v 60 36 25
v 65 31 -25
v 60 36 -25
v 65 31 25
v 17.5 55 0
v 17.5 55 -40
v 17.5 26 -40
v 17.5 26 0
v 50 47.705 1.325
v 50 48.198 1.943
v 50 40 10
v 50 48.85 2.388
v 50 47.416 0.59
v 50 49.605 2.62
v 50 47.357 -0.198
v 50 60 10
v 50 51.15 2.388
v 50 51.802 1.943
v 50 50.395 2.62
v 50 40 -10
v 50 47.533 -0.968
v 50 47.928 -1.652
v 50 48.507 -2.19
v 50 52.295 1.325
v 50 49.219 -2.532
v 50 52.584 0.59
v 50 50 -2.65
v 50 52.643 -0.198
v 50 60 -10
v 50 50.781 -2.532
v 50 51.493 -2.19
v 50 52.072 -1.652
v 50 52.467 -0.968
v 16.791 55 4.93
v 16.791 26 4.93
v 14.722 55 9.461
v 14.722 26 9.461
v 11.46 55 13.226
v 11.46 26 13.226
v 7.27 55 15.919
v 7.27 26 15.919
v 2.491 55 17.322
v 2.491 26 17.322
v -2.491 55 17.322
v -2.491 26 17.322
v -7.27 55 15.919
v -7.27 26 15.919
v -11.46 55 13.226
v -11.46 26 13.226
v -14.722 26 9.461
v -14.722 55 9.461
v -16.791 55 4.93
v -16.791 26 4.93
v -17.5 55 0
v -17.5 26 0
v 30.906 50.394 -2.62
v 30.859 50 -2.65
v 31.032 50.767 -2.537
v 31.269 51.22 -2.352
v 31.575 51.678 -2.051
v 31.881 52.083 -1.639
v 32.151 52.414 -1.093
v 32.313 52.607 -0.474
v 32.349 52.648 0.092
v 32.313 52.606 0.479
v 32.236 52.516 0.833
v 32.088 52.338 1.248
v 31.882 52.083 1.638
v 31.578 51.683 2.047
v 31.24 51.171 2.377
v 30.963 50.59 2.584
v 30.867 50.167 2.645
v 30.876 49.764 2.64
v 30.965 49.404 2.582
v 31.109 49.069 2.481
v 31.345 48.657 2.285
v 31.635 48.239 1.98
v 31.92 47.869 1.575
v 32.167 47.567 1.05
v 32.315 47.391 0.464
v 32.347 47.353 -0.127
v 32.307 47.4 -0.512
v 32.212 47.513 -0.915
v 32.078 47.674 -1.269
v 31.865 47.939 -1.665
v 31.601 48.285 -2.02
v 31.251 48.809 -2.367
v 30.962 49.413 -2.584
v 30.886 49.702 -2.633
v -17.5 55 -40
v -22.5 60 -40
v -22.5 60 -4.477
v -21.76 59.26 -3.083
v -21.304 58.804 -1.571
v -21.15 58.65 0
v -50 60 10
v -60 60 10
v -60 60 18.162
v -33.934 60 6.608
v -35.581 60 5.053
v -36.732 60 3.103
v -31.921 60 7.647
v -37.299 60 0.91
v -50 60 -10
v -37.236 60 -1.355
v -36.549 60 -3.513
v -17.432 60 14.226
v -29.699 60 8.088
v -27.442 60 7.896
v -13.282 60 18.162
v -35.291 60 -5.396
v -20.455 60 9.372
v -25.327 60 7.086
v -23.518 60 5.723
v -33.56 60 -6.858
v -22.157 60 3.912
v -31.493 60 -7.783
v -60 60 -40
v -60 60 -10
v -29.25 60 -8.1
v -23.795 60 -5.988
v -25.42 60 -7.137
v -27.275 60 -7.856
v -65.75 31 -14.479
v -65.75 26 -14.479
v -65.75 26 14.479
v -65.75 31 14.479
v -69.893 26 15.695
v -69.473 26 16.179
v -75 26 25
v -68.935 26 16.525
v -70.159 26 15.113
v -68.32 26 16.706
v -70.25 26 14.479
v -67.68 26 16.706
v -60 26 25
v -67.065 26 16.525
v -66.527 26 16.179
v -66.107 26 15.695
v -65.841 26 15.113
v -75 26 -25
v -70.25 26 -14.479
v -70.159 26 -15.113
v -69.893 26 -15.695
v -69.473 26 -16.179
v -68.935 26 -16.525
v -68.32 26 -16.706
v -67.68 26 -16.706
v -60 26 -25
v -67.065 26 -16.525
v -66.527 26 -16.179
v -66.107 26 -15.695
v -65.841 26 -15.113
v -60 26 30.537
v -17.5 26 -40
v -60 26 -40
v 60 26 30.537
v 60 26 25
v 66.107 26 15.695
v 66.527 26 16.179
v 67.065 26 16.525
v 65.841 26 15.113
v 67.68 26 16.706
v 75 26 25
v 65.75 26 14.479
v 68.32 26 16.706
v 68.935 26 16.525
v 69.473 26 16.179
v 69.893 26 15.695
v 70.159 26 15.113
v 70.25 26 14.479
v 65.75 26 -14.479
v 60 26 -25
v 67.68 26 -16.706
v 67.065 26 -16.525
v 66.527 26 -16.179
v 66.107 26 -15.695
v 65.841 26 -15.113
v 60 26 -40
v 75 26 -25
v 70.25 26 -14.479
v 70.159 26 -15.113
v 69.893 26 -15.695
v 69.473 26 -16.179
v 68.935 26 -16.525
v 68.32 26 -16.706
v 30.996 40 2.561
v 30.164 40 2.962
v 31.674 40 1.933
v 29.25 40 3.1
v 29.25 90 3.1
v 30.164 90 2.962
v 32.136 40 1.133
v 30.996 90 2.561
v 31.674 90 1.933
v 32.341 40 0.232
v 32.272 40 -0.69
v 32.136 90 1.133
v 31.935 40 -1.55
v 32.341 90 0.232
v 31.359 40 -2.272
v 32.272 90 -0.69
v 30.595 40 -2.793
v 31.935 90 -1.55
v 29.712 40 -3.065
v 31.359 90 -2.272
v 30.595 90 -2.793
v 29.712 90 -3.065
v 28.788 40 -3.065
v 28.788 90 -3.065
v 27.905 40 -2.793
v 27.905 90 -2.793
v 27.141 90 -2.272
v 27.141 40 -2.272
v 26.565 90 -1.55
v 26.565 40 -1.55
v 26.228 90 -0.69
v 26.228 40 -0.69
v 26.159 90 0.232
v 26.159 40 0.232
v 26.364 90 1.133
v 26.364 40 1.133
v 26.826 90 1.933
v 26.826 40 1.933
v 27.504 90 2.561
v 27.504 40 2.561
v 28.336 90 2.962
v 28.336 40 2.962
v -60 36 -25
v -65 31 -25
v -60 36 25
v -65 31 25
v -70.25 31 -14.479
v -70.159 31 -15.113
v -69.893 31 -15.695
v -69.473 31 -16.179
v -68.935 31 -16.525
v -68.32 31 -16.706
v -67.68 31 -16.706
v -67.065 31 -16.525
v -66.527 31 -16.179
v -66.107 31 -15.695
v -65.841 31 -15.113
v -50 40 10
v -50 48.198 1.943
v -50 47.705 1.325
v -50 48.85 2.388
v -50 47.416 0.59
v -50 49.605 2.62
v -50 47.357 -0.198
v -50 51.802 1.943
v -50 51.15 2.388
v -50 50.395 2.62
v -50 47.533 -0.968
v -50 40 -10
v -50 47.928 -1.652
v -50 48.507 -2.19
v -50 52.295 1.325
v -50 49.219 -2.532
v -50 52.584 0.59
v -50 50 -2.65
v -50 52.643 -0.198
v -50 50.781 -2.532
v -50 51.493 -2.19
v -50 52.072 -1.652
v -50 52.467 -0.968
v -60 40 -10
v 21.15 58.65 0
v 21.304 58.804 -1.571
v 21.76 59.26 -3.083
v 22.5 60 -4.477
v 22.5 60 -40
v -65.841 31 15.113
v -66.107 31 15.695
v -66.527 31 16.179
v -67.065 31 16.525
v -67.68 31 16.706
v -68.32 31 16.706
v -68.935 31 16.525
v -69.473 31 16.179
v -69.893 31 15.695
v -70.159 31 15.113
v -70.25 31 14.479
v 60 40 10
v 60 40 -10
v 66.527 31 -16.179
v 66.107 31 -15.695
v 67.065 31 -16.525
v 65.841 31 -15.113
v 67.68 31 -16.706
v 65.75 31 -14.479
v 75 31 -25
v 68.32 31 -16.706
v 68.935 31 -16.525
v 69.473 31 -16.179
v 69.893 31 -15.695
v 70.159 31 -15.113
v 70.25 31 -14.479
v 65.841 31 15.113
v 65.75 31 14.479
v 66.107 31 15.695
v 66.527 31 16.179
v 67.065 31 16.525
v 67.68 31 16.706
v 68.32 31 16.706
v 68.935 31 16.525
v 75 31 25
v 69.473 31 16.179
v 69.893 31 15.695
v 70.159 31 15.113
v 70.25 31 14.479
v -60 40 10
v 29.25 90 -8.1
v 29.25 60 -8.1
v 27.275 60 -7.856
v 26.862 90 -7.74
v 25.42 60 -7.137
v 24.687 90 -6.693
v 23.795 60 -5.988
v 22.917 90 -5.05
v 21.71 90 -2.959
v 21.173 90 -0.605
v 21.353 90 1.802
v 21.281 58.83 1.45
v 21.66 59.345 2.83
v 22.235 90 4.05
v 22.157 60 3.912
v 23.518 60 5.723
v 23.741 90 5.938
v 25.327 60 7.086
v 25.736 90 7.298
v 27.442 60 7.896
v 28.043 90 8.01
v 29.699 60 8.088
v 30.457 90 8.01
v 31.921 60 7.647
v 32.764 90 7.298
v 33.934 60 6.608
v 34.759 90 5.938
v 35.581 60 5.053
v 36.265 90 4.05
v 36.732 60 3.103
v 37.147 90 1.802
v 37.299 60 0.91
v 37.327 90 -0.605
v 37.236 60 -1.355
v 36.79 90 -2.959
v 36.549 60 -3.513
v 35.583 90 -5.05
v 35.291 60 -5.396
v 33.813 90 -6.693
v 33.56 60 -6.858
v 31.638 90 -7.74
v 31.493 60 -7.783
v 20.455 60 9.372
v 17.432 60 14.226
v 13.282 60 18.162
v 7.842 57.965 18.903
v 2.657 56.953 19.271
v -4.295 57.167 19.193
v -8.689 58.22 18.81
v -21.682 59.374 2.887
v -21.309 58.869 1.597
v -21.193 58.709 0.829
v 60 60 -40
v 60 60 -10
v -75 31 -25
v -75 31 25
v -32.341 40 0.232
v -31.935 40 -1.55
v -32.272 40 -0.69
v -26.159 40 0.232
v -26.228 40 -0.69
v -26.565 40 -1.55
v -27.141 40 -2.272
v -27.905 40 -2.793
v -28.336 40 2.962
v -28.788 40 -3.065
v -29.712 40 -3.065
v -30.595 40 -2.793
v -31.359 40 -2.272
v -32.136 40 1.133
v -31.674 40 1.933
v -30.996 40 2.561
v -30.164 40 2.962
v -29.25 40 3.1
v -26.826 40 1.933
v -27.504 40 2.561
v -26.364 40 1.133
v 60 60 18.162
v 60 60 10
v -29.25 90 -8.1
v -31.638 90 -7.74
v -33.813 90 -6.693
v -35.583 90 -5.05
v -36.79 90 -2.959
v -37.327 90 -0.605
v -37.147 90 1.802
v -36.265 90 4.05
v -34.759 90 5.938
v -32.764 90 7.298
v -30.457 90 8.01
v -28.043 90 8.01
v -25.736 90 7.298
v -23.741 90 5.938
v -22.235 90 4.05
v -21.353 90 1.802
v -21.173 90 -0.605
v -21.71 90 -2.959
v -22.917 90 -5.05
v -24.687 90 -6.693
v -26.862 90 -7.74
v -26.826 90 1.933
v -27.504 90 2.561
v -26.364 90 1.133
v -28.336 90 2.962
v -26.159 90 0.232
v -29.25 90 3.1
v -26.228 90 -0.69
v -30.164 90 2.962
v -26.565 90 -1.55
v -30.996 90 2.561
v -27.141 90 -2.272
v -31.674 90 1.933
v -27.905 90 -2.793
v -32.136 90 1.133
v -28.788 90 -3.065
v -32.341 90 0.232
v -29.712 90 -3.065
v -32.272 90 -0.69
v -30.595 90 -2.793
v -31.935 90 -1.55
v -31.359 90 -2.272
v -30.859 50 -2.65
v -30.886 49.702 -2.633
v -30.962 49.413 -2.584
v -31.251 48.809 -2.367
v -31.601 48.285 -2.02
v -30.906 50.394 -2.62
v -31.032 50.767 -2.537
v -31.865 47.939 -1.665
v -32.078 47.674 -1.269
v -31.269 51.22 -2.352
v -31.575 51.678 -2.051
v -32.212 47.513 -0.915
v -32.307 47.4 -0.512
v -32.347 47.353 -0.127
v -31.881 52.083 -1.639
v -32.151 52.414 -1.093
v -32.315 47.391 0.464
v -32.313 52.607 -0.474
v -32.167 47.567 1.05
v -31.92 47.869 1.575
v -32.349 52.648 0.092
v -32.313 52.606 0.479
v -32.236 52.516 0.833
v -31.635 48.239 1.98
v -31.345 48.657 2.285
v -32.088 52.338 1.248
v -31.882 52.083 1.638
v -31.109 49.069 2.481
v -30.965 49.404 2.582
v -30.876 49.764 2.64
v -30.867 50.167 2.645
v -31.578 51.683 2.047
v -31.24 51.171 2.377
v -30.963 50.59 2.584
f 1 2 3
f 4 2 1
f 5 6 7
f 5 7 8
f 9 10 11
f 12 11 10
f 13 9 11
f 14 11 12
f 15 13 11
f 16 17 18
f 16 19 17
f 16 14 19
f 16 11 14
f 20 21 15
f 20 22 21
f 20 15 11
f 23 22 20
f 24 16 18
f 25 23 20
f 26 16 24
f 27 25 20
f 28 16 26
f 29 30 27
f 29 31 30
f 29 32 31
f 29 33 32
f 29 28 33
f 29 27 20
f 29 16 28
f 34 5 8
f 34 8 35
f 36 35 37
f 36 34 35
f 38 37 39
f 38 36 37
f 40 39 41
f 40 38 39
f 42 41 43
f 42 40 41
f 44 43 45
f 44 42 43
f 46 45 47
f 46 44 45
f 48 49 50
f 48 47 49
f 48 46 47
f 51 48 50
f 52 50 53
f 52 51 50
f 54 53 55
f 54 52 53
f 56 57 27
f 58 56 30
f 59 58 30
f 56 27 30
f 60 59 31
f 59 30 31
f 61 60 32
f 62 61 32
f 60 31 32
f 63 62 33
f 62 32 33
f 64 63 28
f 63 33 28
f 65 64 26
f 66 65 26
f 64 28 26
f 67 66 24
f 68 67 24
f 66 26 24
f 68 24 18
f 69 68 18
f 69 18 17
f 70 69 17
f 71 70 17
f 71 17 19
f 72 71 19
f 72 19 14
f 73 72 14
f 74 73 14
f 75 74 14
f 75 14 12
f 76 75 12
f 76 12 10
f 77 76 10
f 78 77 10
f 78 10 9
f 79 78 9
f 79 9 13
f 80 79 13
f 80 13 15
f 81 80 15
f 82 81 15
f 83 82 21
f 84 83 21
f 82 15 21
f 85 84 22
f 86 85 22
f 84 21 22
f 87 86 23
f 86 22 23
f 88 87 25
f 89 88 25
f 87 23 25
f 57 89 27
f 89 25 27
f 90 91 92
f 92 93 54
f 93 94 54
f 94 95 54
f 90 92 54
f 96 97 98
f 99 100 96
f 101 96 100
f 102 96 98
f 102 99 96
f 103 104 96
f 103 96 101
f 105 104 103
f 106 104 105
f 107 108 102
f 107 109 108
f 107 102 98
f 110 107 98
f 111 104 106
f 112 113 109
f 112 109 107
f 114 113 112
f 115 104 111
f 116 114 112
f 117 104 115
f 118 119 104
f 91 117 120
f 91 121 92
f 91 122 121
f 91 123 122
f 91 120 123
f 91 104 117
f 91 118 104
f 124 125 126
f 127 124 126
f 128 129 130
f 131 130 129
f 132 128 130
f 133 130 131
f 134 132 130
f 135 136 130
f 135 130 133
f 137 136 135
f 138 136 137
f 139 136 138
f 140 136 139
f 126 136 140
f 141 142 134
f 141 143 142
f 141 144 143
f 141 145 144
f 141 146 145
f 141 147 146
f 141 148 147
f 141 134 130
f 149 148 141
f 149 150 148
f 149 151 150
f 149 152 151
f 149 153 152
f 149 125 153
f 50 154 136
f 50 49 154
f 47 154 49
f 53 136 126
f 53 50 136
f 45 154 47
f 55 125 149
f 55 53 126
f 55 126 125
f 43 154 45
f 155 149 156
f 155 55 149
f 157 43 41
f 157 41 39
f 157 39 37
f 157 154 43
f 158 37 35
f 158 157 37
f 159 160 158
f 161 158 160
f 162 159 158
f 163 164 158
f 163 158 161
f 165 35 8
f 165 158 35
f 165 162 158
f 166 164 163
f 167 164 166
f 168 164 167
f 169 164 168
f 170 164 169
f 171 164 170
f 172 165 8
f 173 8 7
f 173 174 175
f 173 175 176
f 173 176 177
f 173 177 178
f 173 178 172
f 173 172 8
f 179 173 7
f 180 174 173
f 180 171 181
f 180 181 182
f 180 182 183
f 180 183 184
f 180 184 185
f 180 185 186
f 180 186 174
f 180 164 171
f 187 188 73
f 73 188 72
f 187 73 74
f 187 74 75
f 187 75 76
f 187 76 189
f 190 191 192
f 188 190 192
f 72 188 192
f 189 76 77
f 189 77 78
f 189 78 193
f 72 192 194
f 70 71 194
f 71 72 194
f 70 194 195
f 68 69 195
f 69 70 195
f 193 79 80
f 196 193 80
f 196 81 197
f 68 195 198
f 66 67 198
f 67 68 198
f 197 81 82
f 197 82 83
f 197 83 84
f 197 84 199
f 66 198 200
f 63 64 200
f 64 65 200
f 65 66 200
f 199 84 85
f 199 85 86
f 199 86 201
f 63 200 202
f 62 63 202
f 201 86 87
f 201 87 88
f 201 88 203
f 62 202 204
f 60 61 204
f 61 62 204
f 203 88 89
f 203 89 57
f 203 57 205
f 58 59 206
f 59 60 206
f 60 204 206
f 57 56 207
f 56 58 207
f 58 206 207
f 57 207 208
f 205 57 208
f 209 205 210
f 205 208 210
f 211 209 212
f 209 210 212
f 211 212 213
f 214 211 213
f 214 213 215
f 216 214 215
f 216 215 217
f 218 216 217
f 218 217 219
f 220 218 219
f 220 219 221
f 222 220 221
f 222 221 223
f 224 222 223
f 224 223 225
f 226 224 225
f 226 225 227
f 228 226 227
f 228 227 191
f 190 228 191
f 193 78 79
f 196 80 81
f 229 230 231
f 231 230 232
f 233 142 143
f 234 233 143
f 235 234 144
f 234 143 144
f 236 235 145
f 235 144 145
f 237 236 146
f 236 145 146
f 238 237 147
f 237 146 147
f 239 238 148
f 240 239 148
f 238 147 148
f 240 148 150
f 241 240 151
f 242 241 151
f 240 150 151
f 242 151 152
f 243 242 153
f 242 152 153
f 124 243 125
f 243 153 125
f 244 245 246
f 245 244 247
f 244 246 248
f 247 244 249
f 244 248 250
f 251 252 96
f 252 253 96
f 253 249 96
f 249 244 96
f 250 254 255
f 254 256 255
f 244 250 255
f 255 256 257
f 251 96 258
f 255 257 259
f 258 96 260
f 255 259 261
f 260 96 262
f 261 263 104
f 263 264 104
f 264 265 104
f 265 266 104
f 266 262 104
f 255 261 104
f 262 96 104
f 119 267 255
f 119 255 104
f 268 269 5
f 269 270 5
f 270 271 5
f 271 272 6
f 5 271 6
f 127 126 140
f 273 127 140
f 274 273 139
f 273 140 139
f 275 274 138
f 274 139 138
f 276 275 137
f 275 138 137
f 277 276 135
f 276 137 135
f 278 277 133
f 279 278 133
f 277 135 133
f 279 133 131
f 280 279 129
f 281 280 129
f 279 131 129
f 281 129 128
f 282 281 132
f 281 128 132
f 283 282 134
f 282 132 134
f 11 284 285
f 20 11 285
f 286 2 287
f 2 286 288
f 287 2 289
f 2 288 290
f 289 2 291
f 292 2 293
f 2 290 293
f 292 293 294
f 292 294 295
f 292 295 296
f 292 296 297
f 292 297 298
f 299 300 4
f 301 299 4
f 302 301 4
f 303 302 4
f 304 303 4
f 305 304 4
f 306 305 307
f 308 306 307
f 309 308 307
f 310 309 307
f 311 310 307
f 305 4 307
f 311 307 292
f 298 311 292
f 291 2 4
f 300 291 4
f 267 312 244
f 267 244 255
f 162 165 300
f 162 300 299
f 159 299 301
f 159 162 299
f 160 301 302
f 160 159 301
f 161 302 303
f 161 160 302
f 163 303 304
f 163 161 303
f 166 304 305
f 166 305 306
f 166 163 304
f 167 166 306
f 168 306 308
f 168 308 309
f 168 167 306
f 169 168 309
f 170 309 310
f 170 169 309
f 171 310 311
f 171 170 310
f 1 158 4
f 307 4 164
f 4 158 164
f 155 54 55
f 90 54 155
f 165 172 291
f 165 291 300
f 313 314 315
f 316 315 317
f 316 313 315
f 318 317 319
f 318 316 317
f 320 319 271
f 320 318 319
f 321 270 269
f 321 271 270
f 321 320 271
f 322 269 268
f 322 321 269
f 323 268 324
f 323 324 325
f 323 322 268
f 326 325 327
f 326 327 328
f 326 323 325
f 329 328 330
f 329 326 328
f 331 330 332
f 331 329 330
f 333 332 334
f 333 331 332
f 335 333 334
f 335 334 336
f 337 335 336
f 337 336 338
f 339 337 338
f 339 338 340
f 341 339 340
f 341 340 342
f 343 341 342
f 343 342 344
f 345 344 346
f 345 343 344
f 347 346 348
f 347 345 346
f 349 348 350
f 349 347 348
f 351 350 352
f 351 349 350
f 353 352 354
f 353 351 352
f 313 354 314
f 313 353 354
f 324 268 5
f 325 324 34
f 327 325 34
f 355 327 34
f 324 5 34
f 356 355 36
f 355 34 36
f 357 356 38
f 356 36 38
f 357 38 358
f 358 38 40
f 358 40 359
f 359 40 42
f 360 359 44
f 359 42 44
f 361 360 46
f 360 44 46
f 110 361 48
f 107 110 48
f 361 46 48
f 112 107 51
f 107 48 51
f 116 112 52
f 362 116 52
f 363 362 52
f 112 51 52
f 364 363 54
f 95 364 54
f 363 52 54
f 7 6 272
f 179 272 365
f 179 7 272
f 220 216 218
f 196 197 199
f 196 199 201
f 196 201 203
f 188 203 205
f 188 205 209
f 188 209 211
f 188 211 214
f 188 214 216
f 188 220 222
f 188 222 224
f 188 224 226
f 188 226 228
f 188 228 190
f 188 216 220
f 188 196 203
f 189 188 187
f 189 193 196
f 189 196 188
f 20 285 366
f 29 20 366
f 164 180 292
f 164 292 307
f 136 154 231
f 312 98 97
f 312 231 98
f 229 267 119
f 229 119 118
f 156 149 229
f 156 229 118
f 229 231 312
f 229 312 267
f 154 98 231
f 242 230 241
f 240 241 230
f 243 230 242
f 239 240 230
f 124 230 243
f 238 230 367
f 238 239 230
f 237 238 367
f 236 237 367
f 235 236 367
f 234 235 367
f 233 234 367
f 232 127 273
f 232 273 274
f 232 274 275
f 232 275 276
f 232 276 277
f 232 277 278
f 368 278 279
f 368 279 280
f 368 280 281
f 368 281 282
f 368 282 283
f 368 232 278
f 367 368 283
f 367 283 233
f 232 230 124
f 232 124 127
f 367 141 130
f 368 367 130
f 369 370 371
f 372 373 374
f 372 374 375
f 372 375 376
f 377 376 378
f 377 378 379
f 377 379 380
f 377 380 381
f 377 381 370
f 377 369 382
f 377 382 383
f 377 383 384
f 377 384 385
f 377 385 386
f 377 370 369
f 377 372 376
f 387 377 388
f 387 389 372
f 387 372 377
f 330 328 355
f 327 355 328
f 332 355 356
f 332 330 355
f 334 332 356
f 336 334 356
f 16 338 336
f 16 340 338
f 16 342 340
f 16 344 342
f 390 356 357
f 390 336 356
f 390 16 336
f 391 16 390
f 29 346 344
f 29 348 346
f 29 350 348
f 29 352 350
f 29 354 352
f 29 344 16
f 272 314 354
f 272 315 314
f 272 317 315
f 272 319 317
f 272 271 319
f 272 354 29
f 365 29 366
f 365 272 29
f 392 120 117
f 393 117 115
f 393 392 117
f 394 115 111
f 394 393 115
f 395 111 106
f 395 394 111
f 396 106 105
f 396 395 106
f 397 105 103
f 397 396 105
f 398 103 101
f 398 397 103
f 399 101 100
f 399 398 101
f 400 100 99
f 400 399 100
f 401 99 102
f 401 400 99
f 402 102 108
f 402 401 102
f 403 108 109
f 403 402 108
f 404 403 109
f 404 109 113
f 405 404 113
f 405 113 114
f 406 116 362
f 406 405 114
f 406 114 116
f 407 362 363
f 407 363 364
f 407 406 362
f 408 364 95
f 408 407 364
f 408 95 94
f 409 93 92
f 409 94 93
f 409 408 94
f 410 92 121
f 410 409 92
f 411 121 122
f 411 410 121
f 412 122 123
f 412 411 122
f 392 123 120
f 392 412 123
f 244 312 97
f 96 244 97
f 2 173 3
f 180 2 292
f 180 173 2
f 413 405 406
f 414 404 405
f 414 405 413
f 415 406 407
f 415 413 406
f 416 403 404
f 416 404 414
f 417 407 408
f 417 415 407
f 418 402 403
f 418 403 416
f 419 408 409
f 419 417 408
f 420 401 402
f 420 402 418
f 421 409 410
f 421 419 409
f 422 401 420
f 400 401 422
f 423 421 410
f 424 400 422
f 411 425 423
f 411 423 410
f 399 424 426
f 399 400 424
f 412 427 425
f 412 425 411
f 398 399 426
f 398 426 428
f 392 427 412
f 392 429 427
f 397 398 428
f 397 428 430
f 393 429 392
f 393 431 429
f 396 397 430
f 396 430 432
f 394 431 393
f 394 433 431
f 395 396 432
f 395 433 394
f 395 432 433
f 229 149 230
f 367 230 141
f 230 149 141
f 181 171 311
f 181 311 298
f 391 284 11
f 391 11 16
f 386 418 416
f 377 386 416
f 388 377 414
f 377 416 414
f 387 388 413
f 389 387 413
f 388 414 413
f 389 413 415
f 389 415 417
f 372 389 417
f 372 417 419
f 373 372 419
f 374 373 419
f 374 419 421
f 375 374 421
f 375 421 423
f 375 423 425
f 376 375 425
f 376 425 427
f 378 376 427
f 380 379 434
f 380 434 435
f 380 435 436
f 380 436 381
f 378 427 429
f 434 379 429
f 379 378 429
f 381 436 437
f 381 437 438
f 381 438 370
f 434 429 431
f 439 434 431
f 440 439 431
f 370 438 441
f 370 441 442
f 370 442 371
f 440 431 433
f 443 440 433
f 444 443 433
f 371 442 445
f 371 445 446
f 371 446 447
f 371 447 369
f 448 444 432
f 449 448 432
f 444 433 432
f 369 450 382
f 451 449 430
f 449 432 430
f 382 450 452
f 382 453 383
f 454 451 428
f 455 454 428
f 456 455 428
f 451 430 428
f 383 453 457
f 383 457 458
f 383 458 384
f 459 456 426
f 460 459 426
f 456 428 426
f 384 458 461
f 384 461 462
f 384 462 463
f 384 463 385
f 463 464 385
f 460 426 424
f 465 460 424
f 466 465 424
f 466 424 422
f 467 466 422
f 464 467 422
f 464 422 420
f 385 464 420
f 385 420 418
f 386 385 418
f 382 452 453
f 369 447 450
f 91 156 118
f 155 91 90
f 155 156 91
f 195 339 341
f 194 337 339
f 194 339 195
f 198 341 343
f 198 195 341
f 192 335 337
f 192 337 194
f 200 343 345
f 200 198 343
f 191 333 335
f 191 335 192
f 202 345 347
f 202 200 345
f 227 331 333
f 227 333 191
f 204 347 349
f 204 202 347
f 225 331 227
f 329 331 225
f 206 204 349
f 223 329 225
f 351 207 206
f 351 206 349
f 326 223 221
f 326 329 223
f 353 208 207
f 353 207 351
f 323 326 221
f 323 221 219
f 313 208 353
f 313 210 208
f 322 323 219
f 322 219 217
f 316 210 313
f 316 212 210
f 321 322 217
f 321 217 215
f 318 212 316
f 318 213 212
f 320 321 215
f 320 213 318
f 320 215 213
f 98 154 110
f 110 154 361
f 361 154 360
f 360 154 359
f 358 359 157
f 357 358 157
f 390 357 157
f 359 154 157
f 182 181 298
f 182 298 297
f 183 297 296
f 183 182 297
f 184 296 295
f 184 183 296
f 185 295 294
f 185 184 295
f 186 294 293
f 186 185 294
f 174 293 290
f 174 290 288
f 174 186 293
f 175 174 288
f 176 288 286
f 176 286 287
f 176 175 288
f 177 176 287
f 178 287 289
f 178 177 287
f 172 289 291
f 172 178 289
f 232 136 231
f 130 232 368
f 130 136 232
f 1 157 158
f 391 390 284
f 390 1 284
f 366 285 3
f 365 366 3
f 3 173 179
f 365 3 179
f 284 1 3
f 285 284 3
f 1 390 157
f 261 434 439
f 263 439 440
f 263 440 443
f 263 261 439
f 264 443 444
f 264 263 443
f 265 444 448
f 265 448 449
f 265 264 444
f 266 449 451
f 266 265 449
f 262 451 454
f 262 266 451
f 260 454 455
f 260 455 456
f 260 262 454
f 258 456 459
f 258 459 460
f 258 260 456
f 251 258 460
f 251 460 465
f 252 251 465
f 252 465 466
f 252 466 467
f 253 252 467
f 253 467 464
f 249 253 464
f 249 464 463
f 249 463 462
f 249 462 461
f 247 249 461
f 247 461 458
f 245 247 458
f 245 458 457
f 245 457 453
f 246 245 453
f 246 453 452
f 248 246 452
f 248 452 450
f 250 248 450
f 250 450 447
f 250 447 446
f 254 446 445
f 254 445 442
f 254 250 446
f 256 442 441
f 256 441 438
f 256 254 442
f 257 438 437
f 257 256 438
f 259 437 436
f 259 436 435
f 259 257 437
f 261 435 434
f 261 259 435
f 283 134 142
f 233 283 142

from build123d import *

# Parameters (mm, degrees)
SKETCH1_W               = 120
SKETCH1_H               = 80
BOSS_EXTRUDE1_DEPTH     = 60
CUT_EXTRUDE1_DEPTH      = 94.808315196
SKETCH10_R              = 3.1
CUT_EXTRUDE4_DEPTH      = 20
BOSS_EXTRUDE2_START     = 30
SKETCH4_R               = 8.1
SKETCH4_R_2             = 3.1
BOSS_EXTRUDE2_DEPTH     = 30
SKETCH5_W               = 20
SKETCH5_H               = 20
CUT_EXTRUDE3_DEPTH      = 10
CUT_EXTRUDE5_REACH      = 149.648
CUT_EXTRUDE5_END_RADIUS = 3.1
SKETCH6_R               = 2.65
DRAFT2_ANGLE            = -20
CHAMFER3_SIZE           = 5
SKETCH11_W              = 95.774005991
SKETCH11_H              = 26
CUT_EXTRUDE6_DEPTH      = 156.241747021
SKETCH13_W              = 15
SKETCH13_H              = 50
BOSS_EXTRUDE3_DEPTH     = 5
CHAMFER4_SIZE           = 5


with BuildPart() as part:
    # Sketch1 → Boss-Extrude1 (new body)
    with BuildSketch(Plane(origin=(0, 0, 0), x_dir=(1, 0, 0), z_dir=(0, 1, 0))):
        Rectangle(SKETCH1_W, SKETCH1_H)
    extrude(amount=BOSS_EXTRUDE1_DEPTH)

    # Sketch2 → Cut-Extrude1 (cut, through all)
    with BuildSketch(Plane(origin=(0, 60, 0), x_dir=(1, 0, 0), z_dir=(0, 1, 0))):
        with BuildLine():
            Line((-17.5, 0), (-17.5, 40))
            Line((-17.5, 40), (17.5, 40))
            Line((17.5, 40), (17.5, 0))
            ThreePointArc((17.5, 0), (0, -17.5), (-17.5, 0))
        make_face()
    extrude(amount=-CUT_EXTRUDE1_DEPTH, mode=Mode.SUBTRACT)

    # Sketch10 → Cut-Extrude4 (cut)
    with BuildSketch(Plane(origin=(0, 60, 0), x_dir=(1, 0, 0), z_dir=(0, 1, 0))):
        with Locations(Location((-29.25, 0, 0), (0, 0, 270))):
            Circle(SKETCH10_R)
        with Locations(Location((29.25, 0, 0), (0, 0, 270))):
            Circle(SKETCH10_R)
    extrude(amount=-CUT_EXTRUDE4_DEPTH, mode=Mode.SUBTRACT)

    # Sketch4 → Boss-Extrude2 (add)
    # profile 1 of 2: a face of its own
    with BuildSketch(Plane(origin=(0, 60, 0), x_dir=(1, 0, 0), z_dir=(0, 1, 0)).offset(BOSS_EXTRUDE2_START)):
        with Locations(Location((29.25, 0, 0), (0, 0, 90))):
            Circle(SKETCH4_R)
        with Locations(Location((29.25, 0, 0), (0, 0, 270))):
            Circle(SKETCH4_R_2, mode=Mode.SUBTRACT)
    # profile 2 of 2: a face of its own
    with BuildSketch(Plane(origin=(0, 60, 0), x_dir=(1, 0, 0), z_dir=(0, 1, 0)).offset(BOSS_EXTRUDE2_START)):
        with Locations(Location((-29.25, 0, 0), (0, 0, 90))):
            Circle(SKETCH4_R)
        with Locations(Location((-29.25, 0, 0), (0, 0, 270))):
            Circle(SKETCH4_R_2, mode=Mode.SUBTRACT)
    extrude(amount=-BOSS_EXTRUDE2_DEPTH)

    # Sketch5 → Cut-Extrude3 (cut)
    with BuildSketch(Plane(origin=(60, 0, 0), x_dir=(0, 0, -1), z_dir=(1, 0, 0))):
        with Locations((0, 50)):
            Rectangle(SKETCH5_W, SKETCH5_H)
    cut_extrude3 = extrude(amount=-CUT_EXTRUDE3_DEPTH, mode=Mode.SUBTRACT)

    # Cut-Extrude5: up to this cylinder (the profile starts outside it)
    cut_extrude5_end = Plane(origin=(29.25, 50, 0), z_dir=(0, 1, 0)) * Cylinder(CUT_EXTRUDE5_END_RADIUS, 306.496, mode=Mode.PRIVATE)
    # Sketch6 → Cut-Extrude5 (cut, up to the surface)
    with BuildSketch(Plane(origin=(50, 0, 0), x_dir=(0, 0, -1), z_dir=(1, 0, 0)), mode=Mode.PRIVATE) as cut_extrude5_sk1:
        with Locations((0, 50)):
            Circle(SKETCH6_R)
    cut_extrude5_tool1 = extrude(cut_extrude5_sk1.sketch, amount=-CUT_EXTRUDE5_REACH, mode=Mode.PRIVATE) - cut_extrude5_end
    cut_extrude5 = cut_extrude5_tool1.solids().sort_by_distance((50, 50, 0))[0]
    add(cut_extrude5, mode=Mode.SUBTRACT)

    # Mirror2: Cut-Extrude3, Cut-Extrude5 across plane
    add(cut_extrude3.mirror(Plane(origin=(0, 0, 0), x_dir=(0, 0, 1), z_dir=(1, 0, 0))), mode=Mode.SUBTRACT)
    add(cut_extrude5.mirror(Plane(origin=(0, 0, 0), x_dir=(0, 0, 1), z_dir=(1, 0, 0))), mode=Mode.SUBTRACT)

    # Draft2
    draft2_faces = [part.faces().sort_by_distance(p)[0] for p in [
        (0, 30, 40),
    ]]
    draft(draft2_faces, Plane(origin=(0, 0, 0), x_dir=(0, 0, -1), z_dir=(0, -1, 0)), DRAFT2_ANGLE)

    # Chamfer3
    # the kernel refuses this chamfer: 5 mm, written as the material it takes off along each edge
    with BuildSketch(Plane(origin=(0, 60, 0), x_dir=(1, 0, 0), z_dir=(0, 0, -1))) as chamfer3_piece_1_section:
        Polygon((17.5 + CHAMFER3_SIZE, 0), (17.5, CHAMFER3_SIZE), (17.5, 0), align=None)
    chamfer3_piece_1 = revolve(axis=Axis((0, 60, 0), (0, -1, 0)), revolution_arc=180, mode=Mode.PRIVATE)
    chamfer3_piece_1 = chamfer3_piece_1 - Plane(origin=(-29.25, 57.566241365, 0), x_dir=(0, 0, -1), z_dir=(0, 1, 0)) * Cylinder(8.1, 90, mode=Mode.PRIVATE)
    chamfer3_piece_1 = chamfer3_piece_1 - Plane(origin=(29.25, 57.566241365, 0), x_dir=(0, 0, -1), z_dir=(0, 1, 0)) * Cylinder(8.1, 90, mode=Mode.PRIVATE)
    add(chamfer3_piece_1, mode=Mode.SUBTRACT)
    with BuildSketch(Plane(origin=(17.5, 60, -52.85841494), x_dir=(0.9996219169112968, 0.027495876610586317, 0), z_dir=(0, 0, 1))) as chamfer3_piece_2_section:
        Polygon((CHAMFER3_SIZE * 0.999621916911, -CHAMFER3_SIZE * 0.0274958766106), (-CHAMFER3_SIZE * 0.0274958766106, -CHAMFER3_SIZE * 0.999621916911), (0, 0), align=None)
    chamfer3_piece_2 = extrude(amount=52.85841494, mode=Mode.PRIVATE)
    chamfer3_piece_2 = chamfer3_piece_2 - Plane(origin=(29.25, 58.344986743, 0), x_dir=(0, 0, -1), z_dir=(0, 1, 0)) * Cylinder(8.1, 126, mode=Mode.PRIVATE)
    add(chamfer3_piece_2, mode=Mode.SUBTRACT)
    with BuildSketch(Plane(origin=(-17.5, 60, 0), x_dir=(-0.9996219169112968, 0.027495876610586317, 0), z_dir=(0, 0, -1))) as chamfer3_piece_3_section:
        Polygon((CHAMFER3_SIZE * 0.999621916911, -CHAMFER3_SIZE * 0.0274958766106), (-CHAMFER3_SIZE * 0.0274958766106, -CHAMFER3_SIZE * 0.999621916911), (0, 0), align=None)
    chamfer3_piece_3 = extrude(amount=52.85841494, mode=Mode.PRIVATE)
    chamfer3_piece_3 = chamfer3_piece_3 - Plane(origin=(-29.25, 58.344986743, 0), x_dir=(0, 0, -1), z_dir=(0, 1, 0)) * Cylinder(8.1, 126, mode=Mode.PRIVATE)
    add(chamfer3_piece_3, mode=Mode.SUBTRACT)

    # Sketch11 → Cut-Extrude6 (cut, through all)
    with BuildSketch(Plane(origin=(60, 0, 0), x_dir=(0, 0, -1), z_dir=(1, 0, 0))):
        with Locations((1.578345518, 13)):
            Rectangle(SKETCH11_W, SKETCH11_H)
    extrude(amount=-CUT_EXTRUDE6_DEPTH, mode=Mode.SUBTRACT)

    # Sketch13 → Boss-Extrude3 (add)
    with BuildSketch(Plane.XZ.offset(-26)):
        with Locations((67.5, 0)):
            Rectangle(SKETCH13_W, SKETCH13_H)
        with BuildLine():
            Line((70.25, 14.478646417), (70.25, -14.478646417))
            ThreePointArc((70.25, -14.478646417), (68, -16.728646417), (65.75, -14.478646417))
            Line((65.75, -14.478646417), (65.75, 14.478646417))
            ThreePointArc((65.75, 14.478646417), (68, 16.728646417), (70.25, 14.478646417))
        make_face(mode=Mode.SUBTRACT)
    boss_extrude3 = extrude(amount=-BOSS_EXTRUDE3_DEPTH)

    # Mirror3: Boss-Extrude3 across plane
    add(boss_extrude3.mirror(Plane(origin=(0, 0, 0), x_dir=(0, 0, 1), z_dir=(1, 0, 0))))

    # Chamfer4
    chamfer4_edges = [part.edges().sort_by_distance(p)[0] for p in [
        (60, 31, 0),
        (-60, 31, 0),
    ]]
    chamfer(chamfer4_edges, length=CHAMFER4_SIZE)


solid = part.part
